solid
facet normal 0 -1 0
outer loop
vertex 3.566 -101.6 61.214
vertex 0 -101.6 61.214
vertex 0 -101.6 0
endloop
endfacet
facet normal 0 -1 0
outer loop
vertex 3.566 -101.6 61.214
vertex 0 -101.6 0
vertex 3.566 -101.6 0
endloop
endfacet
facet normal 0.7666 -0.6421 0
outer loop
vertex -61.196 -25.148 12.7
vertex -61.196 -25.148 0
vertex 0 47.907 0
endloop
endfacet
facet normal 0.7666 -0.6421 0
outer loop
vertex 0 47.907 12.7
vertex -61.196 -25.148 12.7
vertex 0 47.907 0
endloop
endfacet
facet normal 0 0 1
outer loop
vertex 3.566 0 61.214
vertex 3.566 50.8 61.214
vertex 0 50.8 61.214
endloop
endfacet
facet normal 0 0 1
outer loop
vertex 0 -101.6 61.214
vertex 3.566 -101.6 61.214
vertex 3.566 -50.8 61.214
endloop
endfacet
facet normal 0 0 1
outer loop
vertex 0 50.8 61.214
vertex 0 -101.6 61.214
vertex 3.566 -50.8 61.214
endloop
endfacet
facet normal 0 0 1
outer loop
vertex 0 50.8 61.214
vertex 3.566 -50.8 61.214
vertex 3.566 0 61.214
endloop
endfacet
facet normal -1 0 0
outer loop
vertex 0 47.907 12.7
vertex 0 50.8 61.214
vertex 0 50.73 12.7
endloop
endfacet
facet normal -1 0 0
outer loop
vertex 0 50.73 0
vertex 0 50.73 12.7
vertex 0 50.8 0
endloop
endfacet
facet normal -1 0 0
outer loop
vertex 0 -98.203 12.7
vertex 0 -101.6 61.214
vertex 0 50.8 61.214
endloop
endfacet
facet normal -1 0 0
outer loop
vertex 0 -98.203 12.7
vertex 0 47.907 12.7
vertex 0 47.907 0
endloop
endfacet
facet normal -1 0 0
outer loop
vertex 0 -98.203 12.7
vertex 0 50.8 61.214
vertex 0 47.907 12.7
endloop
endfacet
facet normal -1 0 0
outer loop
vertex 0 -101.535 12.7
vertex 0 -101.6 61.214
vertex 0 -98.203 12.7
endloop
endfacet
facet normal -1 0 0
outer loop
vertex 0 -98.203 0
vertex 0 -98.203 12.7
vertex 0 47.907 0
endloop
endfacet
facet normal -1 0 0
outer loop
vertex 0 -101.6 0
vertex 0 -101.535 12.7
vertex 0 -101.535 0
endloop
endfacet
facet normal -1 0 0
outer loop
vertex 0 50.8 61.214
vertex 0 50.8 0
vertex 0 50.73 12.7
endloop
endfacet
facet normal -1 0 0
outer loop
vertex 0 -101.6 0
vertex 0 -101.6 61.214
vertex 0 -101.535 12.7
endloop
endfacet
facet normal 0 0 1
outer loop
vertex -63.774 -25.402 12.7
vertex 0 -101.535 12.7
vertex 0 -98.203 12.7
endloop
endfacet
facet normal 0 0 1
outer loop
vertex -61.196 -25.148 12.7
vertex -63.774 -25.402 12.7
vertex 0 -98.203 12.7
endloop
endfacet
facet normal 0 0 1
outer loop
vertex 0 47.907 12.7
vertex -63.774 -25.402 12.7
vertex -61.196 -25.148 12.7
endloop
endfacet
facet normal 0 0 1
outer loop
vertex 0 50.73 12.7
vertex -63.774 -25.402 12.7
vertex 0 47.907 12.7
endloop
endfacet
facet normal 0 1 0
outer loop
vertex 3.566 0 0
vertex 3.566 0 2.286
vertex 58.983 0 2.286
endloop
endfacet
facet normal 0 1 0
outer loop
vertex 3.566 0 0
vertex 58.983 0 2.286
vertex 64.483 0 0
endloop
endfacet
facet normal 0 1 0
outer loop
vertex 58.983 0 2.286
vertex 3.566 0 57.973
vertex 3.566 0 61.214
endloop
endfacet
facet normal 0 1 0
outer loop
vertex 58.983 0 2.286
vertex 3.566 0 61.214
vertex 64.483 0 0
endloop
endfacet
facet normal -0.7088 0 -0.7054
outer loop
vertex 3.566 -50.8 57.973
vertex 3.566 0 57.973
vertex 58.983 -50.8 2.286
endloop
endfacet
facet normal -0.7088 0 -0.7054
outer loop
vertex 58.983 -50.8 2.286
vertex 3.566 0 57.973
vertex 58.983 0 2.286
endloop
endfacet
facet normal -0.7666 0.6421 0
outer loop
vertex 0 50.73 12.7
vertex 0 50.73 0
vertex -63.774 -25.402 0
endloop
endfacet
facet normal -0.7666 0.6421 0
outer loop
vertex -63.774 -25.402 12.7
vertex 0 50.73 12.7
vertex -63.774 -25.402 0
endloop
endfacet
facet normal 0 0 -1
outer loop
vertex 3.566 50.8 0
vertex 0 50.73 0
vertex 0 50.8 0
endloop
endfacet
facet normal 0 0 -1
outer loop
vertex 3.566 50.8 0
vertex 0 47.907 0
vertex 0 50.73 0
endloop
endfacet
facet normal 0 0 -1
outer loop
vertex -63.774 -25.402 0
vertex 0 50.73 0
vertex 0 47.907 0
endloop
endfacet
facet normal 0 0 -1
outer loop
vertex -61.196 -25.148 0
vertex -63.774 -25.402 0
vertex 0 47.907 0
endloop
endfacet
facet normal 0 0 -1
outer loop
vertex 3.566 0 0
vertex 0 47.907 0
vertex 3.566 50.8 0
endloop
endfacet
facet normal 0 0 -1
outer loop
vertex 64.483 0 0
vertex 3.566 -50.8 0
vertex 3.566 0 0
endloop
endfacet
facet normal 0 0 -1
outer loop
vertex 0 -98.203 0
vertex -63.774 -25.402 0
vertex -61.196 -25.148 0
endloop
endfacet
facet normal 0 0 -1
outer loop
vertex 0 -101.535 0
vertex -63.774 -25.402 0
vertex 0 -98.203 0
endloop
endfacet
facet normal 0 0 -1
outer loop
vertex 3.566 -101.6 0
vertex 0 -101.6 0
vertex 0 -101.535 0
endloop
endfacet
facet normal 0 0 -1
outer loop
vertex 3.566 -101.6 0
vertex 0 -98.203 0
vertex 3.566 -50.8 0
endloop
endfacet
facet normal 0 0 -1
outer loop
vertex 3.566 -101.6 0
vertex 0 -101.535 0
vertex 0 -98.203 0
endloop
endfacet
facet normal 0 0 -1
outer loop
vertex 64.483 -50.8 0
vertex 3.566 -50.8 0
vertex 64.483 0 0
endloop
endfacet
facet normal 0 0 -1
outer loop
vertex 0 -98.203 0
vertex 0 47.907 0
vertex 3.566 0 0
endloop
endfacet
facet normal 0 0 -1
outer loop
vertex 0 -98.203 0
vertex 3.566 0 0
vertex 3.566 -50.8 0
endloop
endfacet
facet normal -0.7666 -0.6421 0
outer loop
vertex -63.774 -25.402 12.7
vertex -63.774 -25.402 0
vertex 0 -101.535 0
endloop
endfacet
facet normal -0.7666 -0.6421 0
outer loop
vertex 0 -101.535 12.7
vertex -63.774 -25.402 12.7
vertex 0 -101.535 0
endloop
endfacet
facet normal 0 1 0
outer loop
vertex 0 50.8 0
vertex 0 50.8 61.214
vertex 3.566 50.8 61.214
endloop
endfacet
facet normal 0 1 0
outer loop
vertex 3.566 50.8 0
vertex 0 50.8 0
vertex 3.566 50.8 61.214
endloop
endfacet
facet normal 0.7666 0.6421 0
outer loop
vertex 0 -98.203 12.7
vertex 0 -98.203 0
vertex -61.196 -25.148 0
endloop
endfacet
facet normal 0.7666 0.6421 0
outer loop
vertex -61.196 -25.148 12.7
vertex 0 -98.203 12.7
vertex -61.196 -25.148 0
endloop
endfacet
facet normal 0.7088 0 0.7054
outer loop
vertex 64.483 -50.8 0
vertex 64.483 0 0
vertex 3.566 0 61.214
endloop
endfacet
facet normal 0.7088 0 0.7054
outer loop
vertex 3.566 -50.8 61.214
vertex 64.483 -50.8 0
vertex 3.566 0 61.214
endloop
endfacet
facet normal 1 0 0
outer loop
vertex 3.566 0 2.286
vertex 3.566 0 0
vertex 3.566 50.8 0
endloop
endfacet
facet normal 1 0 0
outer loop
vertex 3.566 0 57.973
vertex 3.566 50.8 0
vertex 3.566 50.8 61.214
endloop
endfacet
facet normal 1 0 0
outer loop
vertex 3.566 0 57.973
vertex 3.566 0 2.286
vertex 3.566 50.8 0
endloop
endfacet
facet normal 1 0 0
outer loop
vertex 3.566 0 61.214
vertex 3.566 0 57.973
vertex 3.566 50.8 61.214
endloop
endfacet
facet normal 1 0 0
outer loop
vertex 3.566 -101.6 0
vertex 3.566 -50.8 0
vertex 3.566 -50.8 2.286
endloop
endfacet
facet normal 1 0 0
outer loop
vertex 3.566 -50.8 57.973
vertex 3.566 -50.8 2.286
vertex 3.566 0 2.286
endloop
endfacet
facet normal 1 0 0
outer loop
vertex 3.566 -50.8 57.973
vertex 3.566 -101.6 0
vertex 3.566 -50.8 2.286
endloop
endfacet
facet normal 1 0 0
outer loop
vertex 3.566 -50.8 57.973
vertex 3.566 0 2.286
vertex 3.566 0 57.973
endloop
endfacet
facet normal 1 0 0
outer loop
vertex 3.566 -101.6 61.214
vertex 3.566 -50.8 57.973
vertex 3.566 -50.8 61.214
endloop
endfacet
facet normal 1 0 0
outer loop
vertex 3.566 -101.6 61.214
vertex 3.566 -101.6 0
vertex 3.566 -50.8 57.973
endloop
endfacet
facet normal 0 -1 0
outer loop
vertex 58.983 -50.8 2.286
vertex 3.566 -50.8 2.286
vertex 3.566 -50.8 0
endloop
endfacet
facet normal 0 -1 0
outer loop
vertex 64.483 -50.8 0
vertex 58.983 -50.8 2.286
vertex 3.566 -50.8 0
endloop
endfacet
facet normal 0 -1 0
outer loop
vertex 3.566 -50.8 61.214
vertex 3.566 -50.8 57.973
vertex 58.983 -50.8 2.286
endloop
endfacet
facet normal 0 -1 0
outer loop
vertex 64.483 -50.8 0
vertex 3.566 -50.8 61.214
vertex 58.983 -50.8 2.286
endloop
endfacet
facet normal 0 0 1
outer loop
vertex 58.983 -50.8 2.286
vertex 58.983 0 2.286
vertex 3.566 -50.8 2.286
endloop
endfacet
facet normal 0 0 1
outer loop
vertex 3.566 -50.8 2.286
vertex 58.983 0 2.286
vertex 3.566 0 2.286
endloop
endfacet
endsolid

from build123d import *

# Parameters (mm, degrees)
F1_DEPTH = 101.6
F2_DEPTH = 50.8
F3_DEPTH = 50.8
F5_DEPTH = 12.7


with BuildPart() as f1:
    # F0 (on Front) → F1 (new body)
    with BuildSketch(Plane.XZ):
        Polygon((0, 61.214138), (0, 0), (3.565873, 0), (3.565873, 2.286), (3.565873, 57.973351), (3.565873, 61.214138), align=None)
    extrude(amount=F1_DEPTH)

    # F0 (on Front) → F2 (join)
    with BuildSketch(Plane.XZ):
        Polygon((3.565873, 2.286), (3.565873, 0), (64.482857, 0), (3.565873, 61.214138), (3.565873, 57.973351), (58.982899, 2.286), align=None)
    extrude(amount=F2_DEPTH)

    # F0 (on Front) → F3 (join)
    with BuildSketch(Plane.XZ):
        Polygon((0, 61.214138), (0, 0), (3.565873, 0), (3.565873, 2.286), (3.565873, 57.973351), (3.565873, 61.214138), align=None)
    extrude(amount=-F3_DEPTH)

    # F4 (on Top) → F5 (join)
    with BuildSketch(Plane.XY):
        Polygon((0, 47.907468), (0, 50.730321), (-63.773681, -25.40238), (0, -101.535082), (0, -98.203303), (-61.195922, -25.147918), align=None)
    extrude(amount=F5_DEPTH)


solid = f1.part
